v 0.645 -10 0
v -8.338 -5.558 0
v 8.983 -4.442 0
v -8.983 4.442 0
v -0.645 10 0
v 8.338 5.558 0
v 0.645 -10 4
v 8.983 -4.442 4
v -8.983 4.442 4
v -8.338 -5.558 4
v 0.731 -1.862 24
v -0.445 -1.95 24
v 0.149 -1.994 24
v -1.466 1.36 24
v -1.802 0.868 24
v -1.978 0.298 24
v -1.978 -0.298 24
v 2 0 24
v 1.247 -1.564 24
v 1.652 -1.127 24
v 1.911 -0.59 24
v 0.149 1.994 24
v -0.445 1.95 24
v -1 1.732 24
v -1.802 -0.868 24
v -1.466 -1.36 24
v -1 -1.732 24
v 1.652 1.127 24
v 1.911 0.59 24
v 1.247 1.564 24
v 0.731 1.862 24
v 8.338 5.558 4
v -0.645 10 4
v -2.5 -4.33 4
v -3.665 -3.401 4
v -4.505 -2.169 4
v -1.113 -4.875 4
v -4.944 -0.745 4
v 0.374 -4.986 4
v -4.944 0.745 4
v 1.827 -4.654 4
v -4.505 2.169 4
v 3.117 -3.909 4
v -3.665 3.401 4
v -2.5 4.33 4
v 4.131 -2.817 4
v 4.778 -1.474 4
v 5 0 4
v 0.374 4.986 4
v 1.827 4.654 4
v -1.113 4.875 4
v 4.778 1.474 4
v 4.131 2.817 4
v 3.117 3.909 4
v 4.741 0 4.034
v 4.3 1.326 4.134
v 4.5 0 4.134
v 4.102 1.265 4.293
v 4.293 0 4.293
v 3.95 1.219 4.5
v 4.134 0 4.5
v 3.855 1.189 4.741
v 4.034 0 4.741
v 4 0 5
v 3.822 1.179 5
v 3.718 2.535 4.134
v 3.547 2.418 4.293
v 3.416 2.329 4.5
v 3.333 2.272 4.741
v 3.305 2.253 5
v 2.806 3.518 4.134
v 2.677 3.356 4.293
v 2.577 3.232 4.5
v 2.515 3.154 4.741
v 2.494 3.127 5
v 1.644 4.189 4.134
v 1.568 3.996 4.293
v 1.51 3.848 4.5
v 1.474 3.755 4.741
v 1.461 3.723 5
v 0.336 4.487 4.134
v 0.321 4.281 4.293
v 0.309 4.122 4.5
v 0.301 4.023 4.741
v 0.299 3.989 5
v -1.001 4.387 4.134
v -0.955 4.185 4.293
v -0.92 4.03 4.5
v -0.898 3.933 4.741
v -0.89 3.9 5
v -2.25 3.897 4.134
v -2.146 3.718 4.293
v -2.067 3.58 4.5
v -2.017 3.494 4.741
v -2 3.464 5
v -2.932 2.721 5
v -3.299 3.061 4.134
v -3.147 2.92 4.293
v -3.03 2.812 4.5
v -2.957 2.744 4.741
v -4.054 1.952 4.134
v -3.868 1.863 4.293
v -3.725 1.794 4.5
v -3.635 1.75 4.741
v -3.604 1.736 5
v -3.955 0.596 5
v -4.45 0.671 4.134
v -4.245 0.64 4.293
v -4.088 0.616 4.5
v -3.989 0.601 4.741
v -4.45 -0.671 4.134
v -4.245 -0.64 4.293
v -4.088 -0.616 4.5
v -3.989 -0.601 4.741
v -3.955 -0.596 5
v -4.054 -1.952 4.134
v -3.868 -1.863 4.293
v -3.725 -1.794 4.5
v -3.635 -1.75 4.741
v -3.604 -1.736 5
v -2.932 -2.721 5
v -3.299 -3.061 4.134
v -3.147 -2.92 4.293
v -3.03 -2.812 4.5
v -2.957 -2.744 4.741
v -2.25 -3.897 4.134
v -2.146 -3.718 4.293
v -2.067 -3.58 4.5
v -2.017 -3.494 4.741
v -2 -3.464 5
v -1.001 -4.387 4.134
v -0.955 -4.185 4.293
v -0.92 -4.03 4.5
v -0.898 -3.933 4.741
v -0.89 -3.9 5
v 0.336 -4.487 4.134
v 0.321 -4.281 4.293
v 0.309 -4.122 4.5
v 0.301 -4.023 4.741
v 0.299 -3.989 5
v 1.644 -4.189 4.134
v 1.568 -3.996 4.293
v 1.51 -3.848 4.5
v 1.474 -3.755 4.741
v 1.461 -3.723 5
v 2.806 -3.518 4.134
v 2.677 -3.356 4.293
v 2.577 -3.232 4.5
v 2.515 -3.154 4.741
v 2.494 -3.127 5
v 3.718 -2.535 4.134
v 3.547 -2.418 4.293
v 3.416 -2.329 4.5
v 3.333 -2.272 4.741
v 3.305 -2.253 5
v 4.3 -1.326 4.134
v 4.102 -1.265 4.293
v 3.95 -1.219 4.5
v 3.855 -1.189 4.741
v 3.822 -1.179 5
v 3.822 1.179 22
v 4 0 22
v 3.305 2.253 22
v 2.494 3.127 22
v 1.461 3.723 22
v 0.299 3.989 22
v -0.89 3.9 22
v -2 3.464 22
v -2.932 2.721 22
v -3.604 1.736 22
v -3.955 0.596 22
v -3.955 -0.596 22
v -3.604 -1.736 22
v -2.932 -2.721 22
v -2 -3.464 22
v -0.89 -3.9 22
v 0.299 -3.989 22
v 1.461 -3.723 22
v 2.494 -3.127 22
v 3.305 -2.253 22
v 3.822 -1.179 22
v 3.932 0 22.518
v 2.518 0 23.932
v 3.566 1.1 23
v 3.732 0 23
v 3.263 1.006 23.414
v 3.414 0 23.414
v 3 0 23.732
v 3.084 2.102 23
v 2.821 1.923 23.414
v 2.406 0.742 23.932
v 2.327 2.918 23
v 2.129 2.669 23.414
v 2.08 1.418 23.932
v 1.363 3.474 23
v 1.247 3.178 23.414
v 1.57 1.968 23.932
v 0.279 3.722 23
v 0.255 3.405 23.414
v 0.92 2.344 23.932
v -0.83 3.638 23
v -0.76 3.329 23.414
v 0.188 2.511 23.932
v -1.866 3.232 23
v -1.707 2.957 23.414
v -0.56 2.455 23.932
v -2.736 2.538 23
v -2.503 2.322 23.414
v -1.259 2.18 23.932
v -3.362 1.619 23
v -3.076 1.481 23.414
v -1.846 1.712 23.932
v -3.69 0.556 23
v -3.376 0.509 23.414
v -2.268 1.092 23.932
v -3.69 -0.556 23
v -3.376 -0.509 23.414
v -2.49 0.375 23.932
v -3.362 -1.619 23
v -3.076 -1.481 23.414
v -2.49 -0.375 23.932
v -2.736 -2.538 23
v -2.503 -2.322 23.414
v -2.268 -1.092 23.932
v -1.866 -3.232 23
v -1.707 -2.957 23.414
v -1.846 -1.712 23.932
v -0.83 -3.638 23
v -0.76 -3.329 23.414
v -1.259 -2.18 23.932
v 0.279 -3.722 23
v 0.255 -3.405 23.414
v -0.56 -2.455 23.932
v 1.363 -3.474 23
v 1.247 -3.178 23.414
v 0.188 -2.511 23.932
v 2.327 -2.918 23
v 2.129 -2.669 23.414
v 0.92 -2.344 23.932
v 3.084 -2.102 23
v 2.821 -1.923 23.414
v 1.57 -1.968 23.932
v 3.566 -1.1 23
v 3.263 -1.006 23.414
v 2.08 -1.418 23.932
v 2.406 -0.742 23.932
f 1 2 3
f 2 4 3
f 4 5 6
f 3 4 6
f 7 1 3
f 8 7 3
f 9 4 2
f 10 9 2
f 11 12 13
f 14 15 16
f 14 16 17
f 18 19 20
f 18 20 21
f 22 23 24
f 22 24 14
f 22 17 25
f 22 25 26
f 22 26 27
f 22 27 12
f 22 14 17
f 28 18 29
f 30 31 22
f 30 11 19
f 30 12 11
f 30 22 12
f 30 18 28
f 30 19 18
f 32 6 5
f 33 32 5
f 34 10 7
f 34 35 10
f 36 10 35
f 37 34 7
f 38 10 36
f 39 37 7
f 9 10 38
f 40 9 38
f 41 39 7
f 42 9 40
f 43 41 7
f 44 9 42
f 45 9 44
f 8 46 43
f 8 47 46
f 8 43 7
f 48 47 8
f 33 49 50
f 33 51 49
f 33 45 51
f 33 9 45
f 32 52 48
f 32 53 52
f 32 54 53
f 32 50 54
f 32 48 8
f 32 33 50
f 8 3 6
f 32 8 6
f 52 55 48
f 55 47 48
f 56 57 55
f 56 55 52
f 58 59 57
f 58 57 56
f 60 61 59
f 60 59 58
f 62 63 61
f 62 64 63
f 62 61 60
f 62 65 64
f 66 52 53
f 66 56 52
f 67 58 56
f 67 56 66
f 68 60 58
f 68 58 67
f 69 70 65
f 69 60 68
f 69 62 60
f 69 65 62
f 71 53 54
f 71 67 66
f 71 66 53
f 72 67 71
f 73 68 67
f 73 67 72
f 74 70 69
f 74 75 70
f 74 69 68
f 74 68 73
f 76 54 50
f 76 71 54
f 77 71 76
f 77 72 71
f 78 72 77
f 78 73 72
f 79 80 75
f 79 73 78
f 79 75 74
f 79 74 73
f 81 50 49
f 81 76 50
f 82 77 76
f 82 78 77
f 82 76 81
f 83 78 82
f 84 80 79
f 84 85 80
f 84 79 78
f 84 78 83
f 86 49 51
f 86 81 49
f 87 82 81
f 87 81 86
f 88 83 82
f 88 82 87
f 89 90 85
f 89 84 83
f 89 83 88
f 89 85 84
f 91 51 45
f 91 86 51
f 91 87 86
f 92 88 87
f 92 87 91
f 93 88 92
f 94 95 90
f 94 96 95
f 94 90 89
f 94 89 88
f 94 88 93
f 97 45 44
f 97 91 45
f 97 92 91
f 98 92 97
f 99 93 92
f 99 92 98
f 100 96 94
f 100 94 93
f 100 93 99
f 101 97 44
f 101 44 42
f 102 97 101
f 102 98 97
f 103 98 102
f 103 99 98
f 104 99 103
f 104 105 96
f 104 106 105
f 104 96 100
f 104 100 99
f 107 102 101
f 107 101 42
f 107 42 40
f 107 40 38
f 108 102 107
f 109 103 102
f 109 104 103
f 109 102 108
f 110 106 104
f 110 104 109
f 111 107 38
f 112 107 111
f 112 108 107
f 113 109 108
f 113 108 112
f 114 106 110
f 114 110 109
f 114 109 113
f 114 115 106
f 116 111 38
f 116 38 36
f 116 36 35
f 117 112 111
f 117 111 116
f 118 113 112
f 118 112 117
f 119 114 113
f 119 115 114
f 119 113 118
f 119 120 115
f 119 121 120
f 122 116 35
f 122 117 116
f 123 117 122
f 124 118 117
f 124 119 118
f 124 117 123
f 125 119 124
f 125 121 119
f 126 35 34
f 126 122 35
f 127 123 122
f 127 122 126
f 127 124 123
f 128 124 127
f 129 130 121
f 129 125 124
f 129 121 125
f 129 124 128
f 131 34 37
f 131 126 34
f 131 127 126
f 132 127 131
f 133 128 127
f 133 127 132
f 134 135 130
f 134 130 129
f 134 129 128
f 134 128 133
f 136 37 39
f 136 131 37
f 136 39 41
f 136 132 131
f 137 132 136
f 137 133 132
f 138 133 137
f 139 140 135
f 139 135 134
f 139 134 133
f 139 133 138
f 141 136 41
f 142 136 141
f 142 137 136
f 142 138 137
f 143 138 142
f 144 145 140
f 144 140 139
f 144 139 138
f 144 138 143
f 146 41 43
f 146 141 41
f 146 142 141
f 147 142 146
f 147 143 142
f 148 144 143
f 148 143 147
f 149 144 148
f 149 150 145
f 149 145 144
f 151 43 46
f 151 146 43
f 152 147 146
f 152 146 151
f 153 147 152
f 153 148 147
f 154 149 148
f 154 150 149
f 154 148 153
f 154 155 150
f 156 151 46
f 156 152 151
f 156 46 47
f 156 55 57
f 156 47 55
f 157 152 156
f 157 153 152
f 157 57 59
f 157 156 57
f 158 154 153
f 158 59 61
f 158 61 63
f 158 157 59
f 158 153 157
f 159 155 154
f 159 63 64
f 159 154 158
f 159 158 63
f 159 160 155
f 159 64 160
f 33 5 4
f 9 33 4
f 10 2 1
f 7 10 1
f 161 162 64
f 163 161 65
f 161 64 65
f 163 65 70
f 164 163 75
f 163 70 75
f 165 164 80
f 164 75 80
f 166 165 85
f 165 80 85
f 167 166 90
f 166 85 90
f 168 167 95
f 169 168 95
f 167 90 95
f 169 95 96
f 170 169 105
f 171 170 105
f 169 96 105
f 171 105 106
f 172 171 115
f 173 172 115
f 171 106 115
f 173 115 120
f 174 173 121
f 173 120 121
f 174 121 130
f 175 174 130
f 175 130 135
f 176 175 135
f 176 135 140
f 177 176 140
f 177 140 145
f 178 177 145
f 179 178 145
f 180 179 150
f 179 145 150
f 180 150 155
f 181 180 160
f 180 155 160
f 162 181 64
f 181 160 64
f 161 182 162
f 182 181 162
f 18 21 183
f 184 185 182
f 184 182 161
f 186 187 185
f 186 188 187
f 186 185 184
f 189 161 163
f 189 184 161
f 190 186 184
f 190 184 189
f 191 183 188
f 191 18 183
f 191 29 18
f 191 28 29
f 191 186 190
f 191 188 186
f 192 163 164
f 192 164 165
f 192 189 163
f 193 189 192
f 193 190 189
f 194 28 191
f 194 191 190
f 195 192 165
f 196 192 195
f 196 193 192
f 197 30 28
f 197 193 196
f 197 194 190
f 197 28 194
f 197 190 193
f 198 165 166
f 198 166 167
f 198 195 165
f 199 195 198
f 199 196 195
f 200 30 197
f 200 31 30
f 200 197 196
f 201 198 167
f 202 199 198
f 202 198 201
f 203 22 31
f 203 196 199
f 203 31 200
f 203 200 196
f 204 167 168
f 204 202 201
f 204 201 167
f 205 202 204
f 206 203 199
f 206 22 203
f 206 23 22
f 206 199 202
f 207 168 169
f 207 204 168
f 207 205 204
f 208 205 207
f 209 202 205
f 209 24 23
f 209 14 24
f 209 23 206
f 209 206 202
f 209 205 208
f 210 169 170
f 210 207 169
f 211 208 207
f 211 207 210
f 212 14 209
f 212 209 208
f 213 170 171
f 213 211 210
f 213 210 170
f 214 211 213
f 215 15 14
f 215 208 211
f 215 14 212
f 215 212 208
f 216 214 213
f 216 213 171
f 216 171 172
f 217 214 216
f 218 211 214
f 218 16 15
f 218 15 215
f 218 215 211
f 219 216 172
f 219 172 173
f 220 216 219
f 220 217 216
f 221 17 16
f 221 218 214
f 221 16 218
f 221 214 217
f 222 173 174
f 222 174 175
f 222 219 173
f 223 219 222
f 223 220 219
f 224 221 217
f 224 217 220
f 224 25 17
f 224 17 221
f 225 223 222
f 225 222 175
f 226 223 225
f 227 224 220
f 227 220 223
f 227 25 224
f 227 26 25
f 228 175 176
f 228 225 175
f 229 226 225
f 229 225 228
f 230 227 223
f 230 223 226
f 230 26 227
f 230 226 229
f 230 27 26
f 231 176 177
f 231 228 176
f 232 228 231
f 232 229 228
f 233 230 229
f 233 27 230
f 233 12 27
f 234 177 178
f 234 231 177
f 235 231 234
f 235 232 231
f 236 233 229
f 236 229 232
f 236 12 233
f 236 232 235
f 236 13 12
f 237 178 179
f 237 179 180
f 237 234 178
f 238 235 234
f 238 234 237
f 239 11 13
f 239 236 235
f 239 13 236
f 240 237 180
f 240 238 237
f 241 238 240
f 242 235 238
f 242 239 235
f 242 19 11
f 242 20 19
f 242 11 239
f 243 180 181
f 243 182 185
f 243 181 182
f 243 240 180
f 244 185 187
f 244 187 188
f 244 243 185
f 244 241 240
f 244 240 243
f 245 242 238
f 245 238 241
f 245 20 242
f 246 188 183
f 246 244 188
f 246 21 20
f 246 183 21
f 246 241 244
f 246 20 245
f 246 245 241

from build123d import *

# Parameters (mm, degrees)
EXTRUDE_3_DEPTH = 4
SKETCH_3_R      = 4
EXTRUDE_4_DEPTH = 20
FILLET_1_R      = 1
FILLET_2_R      = 2


with BuildPart() as part:
    # 草图1 → 凸台-拉伸3 (new body)
    with BuildSketch(Plane.XY):
        Polygon((-8.337851922, -5.558416845), (0.644804231, -10), (8.982656153, -4.441583155), (8.337851922, 5.558416845), (-0.644804231, 10), (-8.982656153, 4.441583155), align=None)
    extrude(amount=EXTRUDE_3_DEPTH)

    # 草图3 → 凸台-拉伸4 (add)
    with BuildSketch(Plane.XY.offset(4)):
        Circle(SKETCH_3_R)
    extrude(amount=EXTRUDE_4_DEPTH)

    # 圆角1
    fillet_1_edges = [part.edges().sort_by_distance(p)[0] for p in [
        (-4, 0, 4),
    ]]
    fillet(fillet_1_edges, radius=FILLET_1_R)

    # 圆角2
    fillet_2_edges = [part.edges().sort_by_distance(p)[0] for p in [
        (-4, 0, 24),
    ]]
    fillet(fillet_2_edges, radius=FILLET_2_R)


solid = part.part
